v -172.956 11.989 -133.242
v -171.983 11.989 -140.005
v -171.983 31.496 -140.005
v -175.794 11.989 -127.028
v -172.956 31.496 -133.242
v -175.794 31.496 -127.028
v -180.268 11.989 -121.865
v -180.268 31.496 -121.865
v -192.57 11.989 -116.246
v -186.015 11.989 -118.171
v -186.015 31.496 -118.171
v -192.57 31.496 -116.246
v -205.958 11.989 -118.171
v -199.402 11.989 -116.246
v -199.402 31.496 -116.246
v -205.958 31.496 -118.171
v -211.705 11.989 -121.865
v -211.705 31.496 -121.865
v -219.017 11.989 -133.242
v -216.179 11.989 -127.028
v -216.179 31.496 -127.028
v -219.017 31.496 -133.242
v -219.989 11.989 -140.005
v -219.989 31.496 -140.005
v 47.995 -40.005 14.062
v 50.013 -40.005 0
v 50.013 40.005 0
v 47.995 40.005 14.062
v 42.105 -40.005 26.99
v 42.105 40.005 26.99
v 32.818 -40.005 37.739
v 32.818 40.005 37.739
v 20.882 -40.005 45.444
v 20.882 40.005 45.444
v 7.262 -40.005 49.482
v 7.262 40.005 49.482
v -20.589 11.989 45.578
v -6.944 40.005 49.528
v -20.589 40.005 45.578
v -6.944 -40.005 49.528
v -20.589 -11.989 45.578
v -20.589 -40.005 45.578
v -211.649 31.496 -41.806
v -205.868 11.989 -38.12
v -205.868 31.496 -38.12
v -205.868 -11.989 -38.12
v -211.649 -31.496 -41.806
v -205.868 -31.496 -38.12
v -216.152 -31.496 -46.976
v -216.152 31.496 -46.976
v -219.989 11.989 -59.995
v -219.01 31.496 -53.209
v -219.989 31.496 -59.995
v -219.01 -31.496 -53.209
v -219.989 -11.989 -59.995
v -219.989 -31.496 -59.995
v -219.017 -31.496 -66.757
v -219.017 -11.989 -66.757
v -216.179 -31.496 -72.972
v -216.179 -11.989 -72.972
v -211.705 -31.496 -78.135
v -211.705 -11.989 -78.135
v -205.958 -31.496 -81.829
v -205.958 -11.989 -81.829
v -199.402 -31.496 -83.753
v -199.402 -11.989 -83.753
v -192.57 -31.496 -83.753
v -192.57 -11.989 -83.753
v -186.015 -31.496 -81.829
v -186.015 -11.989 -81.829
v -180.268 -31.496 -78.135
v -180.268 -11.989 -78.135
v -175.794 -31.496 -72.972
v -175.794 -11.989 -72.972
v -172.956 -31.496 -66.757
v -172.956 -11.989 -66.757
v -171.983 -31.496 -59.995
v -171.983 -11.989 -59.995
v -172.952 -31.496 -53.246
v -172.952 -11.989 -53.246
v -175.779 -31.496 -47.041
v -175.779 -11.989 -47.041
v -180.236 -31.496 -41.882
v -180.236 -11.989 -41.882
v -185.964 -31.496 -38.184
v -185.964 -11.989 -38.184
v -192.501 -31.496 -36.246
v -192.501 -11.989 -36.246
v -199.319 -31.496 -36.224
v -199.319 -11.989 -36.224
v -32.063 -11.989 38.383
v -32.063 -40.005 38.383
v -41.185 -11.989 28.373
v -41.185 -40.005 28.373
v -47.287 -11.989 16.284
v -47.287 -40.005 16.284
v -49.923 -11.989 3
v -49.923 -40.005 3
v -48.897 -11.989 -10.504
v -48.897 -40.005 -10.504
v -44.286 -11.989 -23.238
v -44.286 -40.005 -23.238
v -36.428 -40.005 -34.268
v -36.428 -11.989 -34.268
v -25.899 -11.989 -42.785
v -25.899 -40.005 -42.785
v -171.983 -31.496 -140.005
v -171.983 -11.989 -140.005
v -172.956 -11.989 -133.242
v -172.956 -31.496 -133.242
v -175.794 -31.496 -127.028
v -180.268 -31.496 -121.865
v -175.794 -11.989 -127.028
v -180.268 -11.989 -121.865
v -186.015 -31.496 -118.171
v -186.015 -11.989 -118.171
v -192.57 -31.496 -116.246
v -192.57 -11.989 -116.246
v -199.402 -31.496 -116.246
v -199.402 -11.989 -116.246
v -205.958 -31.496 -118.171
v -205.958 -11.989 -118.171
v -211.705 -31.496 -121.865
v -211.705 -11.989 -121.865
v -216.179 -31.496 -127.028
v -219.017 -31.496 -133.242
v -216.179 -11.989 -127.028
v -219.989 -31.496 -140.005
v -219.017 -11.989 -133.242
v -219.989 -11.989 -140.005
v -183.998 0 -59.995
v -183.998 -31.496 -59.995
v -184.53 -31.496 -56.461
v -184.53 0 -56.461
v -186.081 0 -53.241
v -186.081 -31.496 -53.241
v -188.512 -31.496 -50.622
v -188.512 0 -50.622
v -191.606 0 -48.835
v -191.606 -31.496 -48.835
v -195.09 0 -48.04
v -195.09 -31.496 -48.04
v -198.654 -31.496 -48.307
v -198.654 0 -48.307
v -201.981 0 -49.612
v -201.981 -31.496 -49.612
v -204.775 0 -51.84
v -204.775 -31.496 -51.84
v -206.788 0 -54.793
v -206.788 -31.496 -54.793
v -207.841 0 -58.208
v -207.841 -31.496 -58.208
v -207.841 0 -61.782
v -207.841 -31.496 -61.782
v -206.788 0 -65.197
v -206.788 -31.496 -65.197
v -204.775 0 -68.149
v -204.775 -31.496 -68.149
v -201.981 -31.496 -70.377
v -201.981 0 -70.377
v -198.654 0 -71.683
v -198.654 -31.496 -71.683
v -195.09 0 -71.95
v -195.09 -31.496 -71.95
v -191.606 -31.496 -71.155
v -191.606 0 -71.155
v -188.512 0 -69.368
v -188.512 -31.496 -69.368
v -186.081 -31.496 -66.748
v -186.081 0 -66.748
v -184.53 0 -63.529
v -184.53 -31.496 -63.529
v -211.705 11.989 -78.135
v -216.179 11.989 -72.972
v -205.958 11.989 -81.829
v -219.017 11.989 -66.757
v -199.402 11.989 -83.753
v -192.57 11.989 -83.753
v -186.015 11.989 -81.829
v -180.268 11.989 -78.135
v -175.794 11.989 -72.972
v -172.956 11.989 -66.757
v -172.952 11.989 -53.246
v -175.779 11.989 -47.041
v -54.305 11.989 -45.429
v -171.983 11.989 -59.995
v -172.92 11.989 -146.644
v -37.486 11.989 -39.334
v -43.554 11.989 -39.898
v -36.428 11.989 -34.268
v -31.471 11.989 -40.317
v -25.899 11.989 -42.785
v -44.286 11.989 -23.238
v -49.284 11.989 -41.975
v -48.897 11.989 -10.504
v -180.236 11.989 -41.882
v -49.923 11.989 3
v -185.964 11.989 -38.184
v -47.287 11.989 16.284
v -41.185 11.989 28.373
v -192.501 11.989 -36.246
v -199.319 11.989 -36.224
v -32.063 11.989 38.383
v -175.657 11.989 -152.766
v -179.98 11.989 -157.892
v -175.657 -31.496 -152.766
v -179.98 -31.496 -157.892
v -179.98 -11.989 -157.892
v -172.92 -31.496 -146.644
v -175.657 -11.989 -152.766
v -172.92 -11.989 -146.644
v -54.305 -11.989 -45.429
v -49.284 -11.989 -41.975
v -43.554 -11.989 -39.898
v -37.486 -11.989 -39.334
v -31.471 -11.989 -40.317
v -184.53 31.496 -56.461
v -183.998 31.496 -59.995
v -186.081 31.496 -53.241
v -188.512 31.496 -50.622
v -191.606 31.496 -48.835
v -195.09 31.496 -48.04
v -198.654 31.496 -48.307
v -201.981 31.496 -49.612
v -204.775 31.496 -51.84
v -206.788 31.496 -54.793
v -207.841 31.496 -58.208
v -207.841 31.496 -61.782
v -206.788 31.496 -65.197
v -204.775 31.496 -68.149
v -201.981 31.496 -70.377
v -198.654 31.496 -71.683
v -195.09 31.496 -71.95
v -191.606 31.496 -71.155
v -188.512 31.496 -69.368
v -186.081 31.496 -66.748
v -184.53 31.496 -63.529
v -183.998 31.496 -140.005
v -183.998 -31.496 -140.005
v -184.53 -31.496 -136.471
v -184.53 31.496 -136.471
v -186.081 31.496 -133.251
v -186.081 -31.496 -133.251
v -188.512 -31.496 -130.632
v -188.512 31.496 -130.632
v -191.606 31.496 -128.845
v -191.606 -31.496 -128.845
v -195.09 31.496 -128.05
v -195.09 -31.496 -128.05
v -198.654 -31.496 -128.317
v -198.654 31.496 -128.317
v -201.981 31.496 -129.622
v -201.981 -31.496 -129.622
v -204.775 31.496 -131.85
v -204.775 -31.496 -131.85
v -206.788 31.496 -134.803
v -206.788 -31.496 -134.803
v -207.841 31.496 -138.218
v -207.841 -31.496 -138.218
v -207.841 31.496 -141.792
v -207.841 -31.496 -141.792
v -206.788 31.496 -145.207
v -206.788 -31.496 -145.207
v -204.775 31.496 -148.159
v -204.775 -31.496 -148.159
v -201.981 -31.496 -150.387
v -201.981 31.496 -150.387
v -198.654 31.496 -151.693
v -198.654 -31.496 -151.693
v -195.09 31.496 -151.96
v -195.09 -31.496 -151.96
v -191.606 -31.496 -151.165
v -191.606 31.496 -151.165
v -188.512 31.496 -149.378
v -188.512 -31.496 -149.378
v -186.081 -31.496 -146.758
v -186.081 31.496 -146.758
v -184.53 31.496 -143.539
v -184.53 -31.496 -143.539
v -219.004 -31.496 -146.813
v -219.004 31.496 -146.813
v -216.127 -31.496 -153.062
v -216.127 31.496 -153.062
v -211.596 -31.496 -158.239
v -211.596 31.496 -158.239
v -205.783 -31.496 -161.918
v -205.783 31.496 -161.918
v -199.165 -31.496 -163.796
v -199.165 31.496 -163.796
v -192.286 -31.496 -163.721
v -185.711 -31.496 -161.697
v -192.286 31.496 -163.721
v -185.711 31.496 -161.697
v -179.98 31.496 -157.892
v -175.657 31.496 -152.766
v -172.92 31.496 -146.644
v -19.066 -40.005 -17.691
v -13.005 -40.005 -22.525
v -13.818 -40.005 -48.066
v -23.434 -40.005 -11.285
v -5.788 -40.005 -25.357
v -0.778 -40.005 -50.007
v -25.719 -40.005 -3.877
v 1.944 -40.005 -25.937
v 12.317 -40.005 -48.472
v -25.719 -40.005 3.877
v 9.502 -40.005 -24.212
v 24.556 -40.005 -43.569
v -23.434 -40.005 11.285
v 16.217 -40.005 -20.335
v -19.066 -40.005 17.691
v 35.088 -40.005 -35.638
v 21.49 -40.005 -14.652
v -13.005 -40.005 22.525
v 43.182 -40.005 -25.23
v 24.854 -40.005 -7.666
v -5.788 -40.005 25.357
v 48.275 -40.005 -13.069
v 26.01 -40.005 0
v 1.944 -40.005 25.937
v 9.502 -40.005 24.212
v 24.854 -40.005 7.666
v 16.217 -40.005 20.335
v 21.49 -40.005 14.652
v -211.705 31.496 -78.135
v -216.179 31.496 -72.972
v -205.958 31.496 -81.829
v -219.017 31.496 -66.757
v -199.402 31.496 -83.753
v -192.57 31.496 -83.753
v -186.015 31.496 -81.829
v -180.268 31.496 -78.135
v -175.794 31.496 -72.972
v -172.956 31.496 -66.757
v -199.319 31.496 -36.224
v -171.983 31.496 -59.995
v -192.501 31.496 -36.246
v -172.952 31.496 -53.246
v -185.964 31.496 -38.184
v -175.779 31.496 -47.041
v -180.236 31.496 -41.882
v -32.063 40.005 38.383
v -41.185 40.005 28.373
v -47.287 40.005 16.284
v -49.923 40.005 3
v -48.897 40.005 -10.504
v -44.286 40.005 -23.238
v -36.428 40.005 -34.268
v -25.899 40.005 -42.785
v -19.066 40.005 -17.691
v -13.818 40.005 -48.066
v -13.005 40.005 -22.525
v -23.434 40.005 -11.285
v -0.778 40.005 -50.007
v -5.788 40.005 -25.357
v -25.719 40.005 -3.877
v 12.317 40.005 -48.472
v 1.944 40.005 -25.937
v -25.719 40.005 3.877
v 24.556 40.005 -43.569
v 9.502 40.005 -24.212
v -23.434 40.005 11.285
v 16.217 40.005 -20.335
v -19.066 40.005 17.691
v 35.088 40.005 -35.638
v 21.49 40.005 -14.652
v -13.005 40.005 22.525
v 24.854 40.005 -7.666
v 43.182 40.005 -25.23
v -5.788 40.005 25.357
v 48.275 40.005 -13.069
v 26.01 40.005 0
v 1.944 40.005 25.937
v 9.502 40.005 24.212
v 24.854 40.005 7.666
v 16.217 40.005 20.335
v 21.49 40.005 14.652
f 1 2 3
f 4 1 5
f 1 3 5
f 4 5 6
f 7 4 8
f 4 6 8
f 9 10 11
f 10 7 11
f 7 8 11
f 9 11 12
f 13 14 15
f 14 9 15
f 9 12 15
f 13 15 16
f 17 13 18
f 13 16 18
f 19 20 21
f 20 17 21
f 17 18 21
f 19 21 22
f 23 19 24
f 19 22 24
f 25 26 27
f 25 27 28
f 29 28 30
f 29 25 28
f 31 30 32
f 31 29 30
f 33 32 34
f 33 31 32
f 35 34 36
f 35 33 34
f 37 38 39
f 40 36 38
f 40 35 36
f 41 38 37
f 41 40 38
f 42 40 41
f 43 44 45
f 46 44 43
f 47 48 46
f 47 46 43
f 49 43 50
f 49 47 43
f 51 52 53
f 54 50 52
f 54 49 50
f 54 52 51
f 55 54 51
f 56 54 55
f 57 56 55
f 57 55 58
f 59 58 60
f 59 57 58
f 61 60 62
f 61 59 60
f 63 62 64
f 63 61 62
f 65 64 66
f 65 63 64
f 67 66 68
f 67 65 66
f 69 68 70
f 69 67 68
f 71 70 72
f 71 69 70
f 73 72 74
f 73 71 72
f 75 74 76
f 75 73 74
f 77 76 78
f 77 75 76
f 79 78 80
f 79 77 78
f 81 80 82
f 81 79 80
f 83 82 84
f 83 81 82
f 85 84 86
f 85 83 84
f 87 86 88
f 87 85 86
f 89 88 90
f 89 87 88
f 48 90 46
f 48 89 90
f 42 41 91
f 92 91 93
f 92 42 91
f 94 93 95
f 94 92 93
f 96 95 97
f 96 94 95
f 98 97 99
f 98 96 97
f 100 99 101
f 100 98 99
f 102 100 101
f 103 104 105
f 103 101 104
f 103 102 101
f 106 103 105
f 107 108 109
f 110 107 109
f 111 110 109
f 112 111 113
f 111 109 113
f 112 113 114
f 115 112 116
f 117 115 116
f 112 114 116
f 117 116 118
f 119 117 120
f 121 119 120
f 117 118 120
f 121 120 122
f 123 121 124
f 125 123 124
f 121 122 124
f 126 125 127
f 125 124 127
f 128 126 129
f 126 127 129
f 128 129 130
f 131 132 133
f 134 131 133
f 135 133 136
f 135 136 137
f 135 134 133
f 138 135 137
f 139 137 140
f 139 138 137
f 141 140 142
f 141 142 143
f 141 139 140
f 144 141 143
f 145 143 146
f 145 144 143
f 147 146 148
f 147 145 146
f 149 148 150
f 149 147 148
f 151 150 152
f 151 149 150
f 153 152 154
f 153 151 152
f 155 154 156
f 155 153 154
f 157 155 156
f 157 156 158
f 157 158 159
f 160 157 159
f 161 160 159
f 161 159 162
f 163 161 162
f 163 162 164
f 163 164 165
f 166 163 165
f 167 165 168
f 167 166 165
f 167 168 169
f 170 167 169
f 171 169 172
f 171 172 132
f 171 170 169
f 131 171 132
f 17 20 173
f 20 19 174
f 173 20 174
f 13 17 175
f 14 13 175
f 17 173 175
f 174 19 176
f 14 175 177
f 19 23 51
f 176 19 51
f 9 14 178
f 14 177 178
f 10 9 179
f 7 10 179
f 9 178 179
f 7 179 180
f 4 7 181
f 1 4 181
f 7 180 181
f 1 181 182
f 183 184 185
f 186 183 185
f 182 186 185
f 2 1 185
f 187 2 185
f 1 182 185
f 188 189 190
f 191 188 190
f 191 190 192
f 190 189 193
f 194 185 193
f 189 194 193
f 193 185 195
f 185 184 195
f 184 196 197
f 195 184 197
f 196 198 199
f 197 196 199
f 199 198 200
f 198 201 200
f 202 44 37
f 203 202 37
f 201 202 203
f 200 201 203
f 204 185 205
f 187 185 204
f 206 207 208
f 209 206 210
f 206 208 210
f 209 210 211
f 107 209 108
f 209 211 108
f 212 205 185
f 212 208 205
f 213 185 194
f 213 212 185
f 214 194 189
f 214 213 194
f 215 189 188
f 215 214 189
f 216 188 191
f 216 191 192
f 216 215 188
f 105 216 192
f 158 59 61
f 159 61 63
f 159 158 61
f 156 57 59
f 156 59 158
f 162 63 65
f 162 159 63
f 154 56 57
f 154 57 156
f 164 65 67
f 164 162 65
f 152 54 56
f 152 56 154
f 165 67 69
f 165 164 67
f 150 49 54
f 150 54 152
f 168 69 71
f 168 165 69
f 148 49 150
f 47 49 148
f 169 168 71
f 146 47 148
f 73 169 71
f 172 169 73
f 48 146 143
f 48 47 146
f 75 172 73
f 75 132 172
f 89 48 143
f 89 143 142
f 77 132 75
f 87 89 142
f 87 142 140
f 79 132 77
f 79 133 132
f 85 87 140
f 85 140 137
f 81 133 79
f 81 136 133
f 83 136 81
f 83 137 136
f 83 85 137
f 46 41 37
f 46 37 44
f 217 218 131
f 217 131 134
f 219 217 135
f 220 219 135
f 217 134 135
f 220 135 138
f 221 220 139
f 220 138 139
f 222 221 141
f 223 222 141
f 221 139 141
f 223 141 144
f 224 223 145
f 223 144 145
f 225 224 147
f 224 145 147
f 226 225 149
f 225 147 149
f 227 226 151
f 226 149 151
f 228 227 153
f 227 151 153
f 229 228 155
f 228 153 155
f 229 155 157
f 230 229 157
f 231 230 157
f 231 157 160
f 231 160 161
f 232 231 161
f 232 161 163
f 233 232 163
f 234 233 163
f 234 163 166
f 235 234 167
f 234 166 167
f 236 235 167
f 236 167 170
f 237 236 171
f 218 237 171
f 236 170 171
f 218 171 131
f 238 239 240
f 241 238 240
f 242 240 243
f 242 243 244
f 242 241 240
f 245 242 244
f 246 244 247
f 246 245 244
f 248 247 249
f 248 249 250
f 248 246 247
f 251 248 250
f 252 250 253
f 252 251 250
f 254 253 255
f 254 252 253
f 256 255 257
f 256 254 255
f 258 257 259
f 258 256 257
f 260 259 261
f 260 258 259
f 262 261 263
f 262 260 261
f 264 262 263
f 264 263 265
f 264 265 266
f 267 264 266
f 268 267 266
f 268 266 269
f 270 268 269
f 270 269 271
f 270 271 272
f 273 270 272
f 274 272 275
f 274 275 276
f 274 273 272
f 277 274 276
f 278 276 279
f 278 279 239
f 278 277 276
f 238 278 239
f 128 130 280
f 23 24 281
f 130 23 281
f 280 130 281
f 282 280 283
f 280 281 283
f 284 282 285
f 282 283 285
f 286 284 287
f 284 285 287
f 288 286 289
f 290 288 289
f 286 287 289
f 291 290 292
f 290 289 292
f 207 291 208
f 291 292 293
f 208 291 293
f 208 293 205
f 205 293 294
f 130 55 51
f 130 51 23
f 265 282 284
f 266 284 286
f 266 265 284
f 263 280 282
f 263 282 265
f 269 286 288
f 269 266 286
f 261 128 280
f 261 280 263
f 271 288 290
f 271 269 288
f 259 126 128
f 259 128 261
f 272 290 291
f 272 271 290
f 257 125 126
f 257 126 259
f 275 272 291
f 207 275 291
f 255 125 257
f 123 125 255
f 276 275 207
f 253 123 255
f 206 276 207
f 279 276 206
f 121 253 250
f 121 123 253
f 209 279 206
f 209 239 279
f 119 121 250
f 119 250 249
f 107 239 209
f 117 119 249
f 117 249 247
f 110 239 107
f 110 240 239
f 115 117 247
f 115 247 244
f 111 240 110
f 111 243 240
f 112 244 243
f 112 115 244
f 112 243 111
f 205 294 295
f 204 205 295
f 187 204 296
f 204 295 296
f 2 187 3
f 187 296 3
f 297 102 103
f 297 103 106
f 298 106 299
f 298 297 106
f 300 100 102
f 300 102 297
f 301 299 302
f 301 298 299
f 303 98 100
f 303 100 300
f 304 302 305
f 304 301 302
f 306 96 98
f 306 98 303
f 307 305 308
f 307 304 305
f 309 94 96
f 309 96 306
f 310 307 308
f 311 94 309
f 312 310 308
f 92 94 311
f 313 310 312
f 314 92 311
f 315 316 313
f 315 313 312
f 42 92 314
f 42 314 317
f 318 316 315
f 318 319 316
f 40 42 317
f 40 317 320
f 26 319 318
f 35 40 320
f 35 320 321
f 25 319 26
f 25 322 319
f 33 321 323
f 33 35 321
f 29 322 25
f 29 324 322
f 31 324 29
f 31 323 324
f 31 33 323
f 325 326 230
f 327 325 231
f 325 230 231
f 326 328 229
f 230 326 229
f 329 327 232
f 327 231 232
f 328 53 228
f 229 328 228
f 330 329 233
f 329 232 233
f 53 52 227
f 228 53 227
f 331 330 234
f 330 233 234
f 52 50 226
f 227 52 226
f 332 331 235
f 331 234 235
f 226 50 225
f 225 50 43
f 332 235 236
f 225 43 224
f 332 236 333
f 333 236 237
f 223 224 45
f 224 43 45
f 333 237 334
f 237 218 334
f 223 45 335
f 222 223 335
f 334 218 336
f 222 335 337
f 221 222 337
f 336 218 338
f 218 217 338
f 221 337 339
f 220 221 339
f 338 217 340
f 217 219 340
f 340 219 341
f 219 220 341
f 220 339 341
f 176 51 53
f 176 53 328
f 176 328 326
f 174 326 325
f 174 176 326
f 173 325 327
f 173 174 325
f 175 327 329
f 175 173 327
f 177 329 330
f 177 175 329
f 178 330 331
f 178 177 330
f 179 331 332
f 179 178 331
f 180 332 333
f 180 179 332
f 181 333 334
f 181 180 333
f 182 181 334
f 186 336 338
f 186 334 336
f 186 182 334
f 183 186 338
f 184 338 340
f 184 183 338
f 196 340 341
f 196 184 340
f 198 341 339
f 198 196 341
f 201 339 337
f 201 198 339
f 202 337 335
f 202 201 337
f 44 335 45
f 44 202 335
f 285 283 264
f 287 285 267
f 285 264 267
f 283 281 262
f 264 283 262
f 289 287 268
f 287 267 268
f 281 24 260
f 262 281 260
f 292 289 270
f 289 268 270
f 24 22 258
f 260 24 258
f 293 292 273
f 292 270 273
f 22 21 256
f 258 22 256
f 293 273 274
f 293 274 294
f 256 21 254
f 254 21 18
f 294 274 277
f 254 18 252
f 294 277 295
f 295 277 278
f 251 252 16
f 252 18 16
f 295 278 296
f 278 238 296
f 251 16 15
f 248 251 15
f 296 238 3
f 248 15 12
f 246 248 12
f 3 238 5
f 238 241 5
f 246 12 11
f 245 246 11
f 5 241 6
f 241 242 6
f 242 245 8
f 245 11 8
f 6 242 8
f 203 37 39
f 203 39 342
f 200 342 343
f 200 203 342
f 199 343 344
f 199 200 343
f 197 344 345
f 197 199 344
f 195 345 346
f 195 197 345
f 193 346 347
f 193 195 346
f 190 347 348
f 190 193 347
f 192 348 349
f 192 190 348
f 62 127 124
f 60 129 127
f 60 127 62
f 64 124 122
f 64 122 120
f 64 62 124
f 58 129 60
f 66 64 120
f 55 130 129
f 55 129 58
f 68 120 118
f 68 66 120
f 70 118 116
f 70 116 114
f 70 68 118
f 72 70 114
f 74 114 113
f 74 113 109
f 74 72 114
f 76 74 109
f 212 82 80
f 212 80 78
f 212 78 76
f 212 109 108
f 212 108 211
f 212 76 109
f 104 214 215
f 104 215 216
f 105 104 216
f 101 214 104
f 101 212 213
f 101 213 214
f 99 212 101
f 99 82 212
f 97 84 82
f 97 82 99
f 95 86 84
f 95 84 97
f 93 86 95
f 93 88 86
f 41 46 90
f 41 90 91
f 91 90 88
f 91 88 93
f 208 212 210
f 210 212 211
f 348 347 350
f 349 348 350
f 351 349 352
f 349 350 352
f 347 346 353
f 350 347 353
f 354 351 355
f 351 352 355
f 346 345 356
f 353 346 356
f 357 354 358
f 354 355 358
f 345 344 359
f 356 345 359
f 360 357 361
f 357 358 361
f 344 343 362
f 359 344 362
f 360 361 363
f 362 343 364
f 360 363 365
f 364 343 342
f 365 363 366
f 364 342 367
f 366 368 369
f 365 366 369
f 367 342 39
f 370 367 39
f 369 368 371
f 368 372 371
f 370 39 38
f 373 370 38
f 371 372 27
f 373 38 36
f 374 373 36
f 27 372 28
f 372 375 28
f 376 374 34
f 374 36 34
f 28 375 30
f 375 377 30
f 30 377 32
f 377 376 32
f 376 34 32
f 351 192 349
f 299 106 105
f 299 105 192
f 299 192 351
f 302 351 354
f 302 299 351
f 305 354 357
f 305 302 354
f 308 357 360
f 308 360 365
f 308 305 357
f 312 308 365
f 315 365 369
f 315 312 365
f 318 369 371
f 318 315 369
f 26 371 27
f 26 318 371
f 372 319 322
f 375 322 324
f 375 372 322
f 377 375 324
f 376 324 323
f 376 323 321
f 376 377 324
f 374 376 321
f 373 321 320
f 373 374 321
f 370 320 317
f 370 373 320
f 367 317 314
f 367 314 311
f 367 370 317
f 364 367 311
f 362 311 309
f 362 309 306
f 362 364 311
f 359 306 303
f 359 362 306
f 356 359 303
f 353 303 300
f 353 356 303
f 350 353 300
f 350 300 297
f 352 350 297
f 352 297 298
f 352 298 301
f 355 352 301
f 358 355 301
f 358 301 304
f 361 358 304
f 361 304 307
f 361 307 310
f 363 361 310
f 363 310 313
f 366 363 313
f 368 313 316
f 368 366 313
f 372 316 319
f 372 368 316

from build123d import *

# Parameters (mm, degrees)
F0_R     = 26.0096
F1_DEPTH = 40.005
F0_R_2   = 11.9888
F2_DEPTH = 31.496
F3_DEPTH = 11.9888


with BuildPart() as f1:
    # F0 (on Front) → F1 (new body, symmetric)
    with BuildSketch(Plane.XZ):
        with BuildLine():
            ThreePointArc((-25.898693, -42.784552), (24.55605, -43.569032), (50.0126, 0))
            ThreePointArc((50.0126, 0), (27.125002, 42.017787), (-20.589386, 45.577816))
            ThreePointArc((-20.589386, 45.577816), (-49.922564, 2.999628), (-25.898693, -42.784552))
        make_face()
        Circle(F0_R, mode=Mode.SUBTRACT)
    extrude(amount=F1_DEPTH, both=True)



with BuildPart() as f2:
    # F0 (on Front) → F2 (new body, symmetric)
    with BuildSketch(Plane.XZ):
        with BuildLine():
            ThreePointArc((-219.9894, -140.0048), (-205.782899, -161.917641), (-179.980017, -157.891659))
            ThreePointArc((-179.980017, -157.891659), (-174.073559, -149.801299), (-171.9834, -140.0048))
            ThreePointArc((-171.9834, -140.0048), (-195.9864, -116.0018), (-219.9894, -140.0048))
        make_face()
        with Locations((-195.9864, -140.0048)):
            Circle(F0_R_2, mode=Mode.SUBTRACT)
        with BuildLine():
            ThreePointArc((-171.9834, -59.9948), (-182.968052, -39.828823), (-205.868051, -38.120226))
            ThreePointArc((-205.868051, -38.120226), (-216.152377, -46.976452), (-219.9894, -59.9948))
            ThreePointArc((-219.9894, -59.9948), (-195.9864, -83.9978), (-171.9834, -59.9948))
        make_face()
        with Locations((-195.9864, -59.9948)):
            Circle(F0_R_2, mode=Mode.SUBTRACT)
    extrude(amount=F2_DEPTH, both=True)


with BuildPart() as f1_1:
    add(f1.part)

    add(f2.part)  # F3 merges F2
    # F0 (on Front) → F3 (join, symmetric)
    with BuildSketch(Plane.XZ):
        with BuildLine():
            ThreePointArc((-25.898693, -42.784552), (-49.922564, 2.999628), (-20.589386, 45.577816))
            Line((-20.589386, 45.577816), (-205.868051, -38.120226))
            ThreePointArc((-205.868051, -38.120226), (-182.968052, -39.828823), (-171.9834, -59.9948))
            ThreePointArc((-171.9834, -59.9948), (-195.9864, -83.9978), (-219.9894, -59.9948))
            Line((-219.9894, -59.9948), (-219.9894, -140.0048))
            ThreePointArc((-219.9894, -140.0048), (-195.9864, -116.0018), (-171.9834, -140.0048))
            ThreePointArc((-171.9834, -140.0048), (-174.073559, -149.801299), (-179.980017, -157.891659))
            Line((-179.980017, -157.891659), (-54.304779, -45.428869))
            ThreePointArc((-54.304779, -45.428869), (-40.537796, -39.422421), (-25.898693, -42.784552))
        make_face()
    extrude(amount=F3_DEPTH, both=True)


solid = f1_1.part
